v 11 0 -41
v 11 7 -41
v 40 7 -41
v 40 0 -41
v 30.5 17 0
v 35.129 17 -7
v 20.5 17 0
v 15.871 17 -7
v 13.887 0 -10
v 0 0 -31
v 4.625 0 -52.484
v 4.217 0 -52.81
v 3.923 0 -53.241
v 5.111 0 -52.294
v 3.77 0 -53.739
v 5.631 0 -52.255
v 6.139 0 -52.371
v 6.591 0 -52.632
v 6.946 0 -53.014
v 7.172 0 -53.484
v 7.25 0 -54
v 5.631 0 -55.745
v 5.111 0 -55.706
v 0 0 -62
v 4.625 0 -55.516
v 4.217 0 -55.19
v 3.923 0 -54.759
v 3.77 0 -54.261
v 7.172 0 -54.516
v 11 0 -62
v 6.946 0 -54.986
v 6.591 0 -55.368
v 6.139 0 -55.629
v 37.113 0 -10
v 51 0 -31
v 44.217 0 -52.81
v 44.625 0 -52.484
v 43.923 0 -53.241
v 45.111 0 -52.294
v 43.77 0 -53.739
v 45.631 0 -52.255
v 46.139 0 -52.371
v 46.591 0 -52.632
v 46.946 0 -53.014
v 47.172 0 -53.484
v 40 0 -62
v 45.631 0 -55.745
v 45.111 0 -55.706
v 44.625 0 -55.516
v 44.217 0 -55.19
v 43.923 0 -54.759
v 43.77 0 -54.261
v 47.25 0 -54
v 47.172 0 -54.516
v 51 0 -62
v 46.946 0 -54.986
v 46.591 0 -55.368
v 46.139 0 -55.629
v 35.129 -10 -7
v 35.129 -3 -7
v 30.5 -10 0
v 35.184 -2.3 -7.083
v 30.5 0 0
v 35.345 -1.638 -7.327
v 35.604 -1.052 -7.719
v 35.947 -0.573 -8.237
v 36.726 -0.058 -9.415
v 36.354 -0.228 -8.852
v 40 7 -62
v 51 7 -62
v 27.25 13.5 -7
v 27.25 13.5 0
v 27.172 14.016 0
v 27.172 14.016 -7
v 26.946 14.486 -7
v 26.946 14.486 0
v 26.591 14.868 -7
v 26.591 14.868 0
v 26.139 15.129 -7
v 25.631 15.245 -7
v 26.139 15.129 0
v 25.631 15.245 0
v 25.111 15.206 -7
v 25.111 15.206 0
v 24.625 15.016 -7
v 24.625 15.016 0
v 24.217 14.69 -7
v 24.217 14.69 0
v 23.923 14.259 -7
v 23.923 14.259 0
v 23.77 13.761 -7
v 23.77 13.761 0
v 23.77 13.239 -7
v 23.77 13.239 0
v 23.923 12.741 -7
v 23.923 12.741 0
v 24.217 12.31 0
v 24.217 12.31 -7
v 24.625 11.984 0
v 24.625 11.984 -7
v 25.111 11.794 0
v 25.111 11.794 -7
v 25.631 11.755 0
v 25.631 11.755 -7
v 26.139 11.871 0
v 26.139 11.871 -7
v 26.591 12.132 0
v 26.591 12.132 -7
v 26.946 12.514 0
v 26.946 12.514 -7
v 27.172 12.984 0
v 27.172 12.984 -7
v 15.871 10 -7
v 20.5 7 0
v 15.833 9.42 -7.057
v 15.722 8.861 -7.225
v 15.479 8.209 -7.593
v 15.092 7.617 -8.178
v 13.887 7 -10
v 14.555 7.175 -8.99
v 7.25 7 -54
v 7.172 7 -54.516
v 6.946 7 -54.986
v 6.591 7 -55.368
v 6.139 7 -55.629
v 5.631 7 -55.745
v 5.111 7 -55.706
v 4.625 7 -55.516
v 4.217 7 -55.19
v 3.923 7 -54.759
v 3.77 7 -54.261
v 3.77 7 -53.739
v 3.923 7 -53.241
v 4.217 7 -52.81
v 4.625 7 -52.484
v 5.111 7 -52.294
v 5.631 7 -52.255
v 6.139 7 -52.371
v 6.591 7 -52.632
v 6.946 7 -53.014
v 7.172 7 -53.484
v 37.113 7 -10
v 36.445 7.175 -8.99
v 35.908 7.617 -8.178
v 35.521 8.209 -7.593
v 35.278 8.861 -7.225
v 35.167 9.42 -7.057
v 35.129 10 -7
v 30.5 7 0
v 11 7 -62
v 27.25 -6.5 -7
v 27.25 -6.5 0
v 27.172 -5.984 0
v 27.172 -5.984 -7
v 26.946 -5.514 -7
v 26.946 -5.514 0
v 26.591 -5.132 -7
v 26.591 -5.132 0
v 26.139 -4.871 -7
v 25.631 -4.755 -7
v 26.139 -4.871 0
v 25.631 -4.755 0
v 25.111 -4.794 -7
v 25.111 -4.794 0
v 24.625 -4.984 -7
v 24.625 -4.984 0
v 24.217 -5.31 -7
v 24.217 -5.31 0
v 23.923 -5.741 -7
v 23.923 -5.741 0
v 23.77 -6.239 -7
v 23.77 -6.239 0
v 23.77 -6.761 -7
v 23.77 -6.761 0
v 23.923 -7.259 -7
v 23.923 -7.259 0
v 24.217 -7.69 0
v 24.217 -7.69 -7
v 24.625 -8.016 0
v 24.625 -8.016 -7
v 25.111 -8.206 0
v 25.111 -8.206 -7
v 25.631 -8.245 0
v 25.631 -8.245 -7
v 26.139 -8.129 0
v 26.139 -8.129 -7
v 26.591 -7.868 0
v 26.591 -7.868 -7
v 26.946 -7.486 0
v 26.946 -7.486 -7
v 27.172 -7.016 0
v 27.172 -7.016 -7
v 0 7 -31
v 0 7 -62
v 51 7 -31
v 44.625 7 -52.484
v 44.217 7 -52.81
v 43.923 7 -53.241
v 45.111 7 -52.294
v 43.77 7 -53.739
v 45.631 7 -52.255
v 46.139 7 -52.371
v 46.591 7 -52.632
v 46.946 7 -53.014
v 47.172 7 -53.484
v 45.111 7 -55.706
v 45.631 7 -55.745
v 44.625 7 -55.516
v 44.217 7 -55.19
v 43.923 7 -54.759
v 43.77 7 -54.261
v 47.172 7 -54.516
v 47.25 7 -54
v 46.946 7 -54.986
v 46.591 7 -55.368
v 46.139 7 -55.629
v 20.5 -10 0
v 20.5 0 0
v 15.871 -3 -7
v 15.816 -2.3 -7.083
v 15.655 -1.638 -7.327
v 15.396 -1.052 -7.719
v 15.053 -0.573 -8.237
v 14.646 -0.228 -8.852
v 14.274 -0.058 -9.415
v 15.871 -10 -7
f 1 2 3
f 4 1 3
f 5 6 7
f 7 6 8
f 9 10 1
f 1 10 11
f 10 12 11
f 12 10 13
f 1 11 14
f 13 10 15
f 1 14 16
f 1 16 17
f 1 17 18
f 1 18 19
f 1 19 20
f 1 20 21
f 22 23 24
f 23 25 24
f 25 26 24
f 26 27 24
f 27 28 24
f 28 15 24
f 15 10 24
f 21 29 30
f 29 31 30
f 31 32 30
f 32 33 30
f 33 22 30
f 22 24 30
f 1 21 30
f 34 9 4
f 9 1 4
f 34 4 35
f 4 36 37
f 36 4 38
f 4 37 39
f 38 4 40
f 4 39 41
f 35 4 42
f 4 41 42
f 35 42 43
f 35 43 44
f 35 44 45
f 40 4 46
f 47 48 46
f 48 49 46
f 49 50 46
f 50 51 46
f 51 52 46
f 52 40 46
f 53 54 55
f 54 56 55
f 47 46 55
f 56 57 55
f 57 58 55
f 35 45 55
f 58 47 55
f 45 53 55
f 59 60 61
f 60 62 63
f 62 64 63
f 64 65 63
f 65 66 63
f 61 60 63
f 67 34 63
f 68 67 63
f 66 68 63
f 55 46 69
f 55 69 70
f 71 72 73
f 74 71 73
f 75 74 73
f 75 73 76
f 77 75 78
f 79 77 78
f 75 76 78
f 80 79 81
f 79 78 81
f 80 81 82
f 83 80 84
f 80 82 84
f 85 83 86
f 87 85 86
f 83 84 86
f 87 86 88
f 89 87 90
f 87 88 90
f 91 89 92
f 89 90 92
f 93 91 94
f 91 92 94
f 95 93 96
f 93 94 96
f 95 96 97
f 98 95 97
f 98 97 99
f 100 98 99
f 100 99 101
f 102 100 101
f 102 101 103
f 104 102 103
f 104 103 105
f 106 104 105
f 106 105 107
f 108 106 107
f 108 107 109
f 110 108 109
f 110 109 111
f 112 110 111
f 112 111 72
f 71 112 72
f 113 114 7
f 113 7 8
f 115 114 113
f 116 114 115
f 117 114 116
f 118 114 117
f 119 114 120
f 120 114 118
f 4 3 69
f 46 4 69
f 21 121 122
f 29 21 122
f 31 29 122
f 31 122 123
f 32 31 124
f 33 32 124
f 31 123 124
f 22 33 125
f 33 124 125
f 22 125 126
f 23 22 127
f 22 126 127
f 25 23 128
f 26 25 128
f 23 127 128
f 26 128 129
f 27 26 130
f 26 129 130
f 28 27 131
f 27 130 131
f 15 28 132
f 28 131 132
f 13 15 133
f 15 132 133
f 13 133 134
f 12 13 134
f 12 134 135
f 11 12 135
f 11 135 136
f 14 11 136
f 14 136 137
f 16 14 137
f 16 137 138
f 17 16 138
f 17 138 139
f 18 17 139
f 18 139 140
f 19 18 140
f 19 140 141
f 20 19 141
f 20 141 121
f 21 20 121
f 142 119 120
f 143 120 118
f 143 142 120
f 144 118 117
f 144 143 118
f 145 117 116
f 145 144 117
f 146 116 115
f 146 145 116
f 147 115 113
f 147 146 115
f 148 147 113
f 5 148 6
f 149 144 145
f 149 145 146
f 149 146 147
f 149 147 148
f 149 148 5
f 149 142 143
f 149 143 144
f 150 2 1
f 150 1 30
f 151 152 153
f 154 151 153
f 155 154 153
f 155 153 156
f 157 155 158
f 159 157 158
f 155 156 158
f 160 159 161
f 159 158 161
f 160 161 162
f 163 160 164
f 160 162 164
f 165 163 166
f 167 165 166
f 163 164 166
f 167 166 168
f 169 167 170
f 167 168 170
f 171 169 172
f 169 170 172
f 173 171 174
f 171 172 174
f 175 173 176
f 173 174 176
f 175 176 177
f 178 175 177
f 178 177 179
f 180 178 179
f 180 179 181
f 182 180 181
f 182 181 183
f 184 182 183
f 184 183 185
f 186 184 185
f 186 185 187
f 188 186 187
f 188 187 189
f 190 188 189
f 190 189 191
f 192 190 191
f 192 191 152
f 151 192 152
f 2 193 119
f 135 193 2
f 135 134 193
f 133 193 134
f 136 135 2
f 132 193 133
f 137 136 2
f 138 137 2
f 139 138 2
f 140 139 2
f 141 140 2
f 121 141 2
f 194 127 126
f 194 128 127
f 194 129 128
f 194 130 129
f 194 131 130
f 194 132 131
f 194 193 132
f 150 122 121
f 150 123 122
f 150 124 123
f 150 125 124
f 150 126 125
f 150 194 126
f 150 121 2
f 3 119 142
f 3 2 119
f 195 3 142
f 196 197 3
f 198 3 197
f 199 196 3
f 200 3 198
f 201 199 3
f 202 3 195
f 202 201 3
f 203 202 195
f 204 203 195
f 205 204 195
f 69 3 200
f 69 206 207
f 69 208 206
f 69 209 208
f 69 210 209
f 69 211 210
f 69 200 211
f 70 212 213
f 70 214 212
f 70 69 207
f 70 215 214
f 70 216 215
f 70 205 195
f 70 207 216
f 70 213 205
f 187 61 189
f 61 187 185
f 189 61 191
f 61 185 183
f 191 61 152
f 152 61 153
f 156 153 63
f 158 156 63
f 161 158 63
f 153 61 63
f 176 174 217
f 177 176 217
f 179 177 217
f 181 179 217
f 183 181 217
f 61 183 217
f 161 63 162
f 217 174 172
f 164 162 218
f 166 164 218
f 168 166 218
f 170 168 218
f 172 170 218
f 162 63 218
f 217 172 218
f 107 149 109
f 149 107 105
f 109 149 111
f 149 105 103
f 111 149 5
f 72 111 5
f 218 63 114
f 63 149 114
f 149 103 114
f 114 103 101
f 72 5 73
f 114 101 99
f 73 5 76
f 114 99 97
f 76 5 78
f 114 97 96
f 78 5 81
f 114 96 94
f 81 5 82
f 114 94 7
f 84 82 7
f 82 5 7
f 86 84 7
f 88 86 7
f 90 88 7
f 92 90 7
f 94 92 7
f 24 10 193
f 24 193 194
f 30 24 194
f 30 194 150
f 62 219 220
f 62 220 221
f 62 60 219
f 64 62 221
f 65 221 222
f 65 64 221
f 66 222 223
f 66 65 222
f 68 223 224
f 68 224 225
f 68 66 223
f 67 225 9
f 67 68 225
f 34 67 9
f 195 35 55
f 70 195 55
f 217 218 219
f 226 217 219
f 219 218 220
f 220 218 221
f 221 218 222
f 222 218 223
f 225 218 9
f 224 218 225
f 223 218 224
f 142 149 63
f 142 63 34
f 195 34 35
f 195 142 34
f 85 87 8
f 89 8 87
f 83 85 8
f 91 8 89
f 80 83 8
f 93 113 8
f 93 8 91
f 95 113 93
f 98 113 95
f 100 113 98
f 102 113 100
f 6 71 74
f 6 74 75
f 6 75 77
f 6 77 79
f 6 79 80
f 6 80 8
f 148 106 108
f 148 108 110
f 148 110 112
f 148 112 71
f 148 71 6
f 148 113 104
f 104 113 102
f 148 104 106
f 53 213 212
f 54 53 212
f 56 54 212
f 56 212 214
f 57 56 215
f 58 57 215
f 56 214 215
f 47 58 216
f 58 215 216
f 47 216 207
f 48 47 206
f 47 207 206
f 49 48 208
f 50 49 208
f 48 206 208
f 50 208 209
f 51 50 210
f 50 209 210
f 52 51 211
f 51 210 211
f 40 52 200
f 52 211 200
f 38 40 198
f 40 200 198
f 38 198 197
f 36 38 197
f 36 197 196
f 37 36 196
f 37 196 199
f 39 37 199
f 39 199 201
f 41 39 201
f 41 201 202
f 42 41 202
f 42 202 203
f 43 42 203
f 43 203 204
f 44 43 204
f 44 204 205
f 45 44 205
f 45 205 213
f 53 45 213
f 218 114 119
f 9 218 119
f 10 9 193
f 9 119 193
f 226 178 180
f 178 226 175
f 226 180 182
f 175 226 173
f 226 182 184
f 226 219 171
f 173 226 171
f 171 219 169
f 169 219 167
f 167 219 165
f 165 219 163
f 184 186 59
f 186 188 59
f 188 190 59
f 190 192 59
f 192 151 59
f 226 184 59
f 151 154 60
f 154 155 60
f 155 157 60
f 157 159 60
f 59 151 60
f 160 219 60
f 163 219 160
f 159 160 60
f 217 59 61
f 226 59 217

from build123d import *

# Parameters (mm, degrees)
SKETCH1_W           = 51
SKETCH1_H           = 62
BOSS_EXTRUDE1_DEPTH = 7
SKETCH2_W           = 29
SKETCH2_H           = 21
CUT_EXTRUDE1_DEPTH  = 8
SKETCH9_R           = 1.75
CUT_EXTRUDE4_DEPTH  = 8
CUT_EXTRUDE5_DEPTH  = 8
BOSS_EXTRUDE4_DEPTH = 10
SKETCH13_R          = 1.75
CUT_EXTRUDE6_DEPTH  = 63
FILLET1_R           = 3


with BuildPart() as part:
    # Sketch1 → Boss-Extrude1 (new body)
    with BuildSketch(Plane(origin=(0, 0, 0), x_dir=(1, 0, 0), z_dir=(0, 1, 0))):
        with Locations((25.5, 31)):
            Rectangle(SKETCH1_W, SKETCH1_H)
    extrude(amount=BOSS_EXTRUDE1_DEPTH)

    # Sketch2 → Cut-Extrude1 (cut, through all)
    with BuildSketch(Plane(origin=(0, 7, 0), x_dir=(1, 0, 0), z_dir=(0, 1, 0))):
        with Locations((25.5, 51.5)):
            Rectangle(SKETCH2_W, SKETCH2_H)
    extrude(amount=-CUT_EXTRUDE1_DEPTH, mode=Mode.SUBTRACT)

    # Sketch9 → Cut-Extrude4 (cut, through all)
    with BuildSketch(Plane(origin=(0, 7, 0), x_dir=(1, 0, 0), z_dir=(0, 1, 0))):
        with Locations((5.5, 54)):
            Circle(SKETCH9_R)
        with Locations((45.5, 54)):
            Circle(SKETCH9_R)
    extrude(amount=-CUT_EXTRUDE4_DEPTH, mode=Mode.SUBTRACT)

    # Sketch11 → Cut-Extrude5 (cut, through all)
    with BuildSketch(Plane(origin=(0, 7, 0), x_dir=(1, 0, 0), z_dir=(0, 1, 0))):
        Polygon((20.5, 0), (0, 31), (0, 0), align=None)
        Polygon((30.5, 0), (51, 31), (51, 0), align=None)
    extrude(amount=-CUT_EXTRUDE5_DEPTH, mode=Mode.SUBTRACT)

    # Sketch12 → Boss-Extrude4 (add)
    with BuildSketch(Plane(origin=(0, 7, 0), x_dir=(1, 0, 0), z_dir=(0, 1, 0))):
        Polygon((30.5, 0), (20.5, 0), (15.870967742, 7), (35.129032258, 7), align=None)
    boss_extrude4 = extrude(amount=BOSS_EXTRUDE4_DEPTH)

    # Mirror1: Boss-Extrude4 across plane
    add(boss_extrude4.mirror(Plane.ZX.offset(3.5)))

    # Sketch13 → Cut-Extrude6 (cut, through all)
    with BuildSketch(Plane.XY):
        with Locations((25.5, 13.5)):
            Circle(SKETCH13_R)
        with Locations((25.5, -6.5)):
            Circle(SKETCH13_R)
    extrude(amount=-CUT_EXTRUDE6_DEPTH, mode=Mode.SUBTRACT)

    # Fillet1
    fillet1_edges = [part.edges().sort_by_distance(p)[0] for p in [
        (25.5, 7, -7),
        (25.5, 0, -7),
    ]]
    fillet(fillet1_edges, radius=FILLET1_R)


solid = part.part
